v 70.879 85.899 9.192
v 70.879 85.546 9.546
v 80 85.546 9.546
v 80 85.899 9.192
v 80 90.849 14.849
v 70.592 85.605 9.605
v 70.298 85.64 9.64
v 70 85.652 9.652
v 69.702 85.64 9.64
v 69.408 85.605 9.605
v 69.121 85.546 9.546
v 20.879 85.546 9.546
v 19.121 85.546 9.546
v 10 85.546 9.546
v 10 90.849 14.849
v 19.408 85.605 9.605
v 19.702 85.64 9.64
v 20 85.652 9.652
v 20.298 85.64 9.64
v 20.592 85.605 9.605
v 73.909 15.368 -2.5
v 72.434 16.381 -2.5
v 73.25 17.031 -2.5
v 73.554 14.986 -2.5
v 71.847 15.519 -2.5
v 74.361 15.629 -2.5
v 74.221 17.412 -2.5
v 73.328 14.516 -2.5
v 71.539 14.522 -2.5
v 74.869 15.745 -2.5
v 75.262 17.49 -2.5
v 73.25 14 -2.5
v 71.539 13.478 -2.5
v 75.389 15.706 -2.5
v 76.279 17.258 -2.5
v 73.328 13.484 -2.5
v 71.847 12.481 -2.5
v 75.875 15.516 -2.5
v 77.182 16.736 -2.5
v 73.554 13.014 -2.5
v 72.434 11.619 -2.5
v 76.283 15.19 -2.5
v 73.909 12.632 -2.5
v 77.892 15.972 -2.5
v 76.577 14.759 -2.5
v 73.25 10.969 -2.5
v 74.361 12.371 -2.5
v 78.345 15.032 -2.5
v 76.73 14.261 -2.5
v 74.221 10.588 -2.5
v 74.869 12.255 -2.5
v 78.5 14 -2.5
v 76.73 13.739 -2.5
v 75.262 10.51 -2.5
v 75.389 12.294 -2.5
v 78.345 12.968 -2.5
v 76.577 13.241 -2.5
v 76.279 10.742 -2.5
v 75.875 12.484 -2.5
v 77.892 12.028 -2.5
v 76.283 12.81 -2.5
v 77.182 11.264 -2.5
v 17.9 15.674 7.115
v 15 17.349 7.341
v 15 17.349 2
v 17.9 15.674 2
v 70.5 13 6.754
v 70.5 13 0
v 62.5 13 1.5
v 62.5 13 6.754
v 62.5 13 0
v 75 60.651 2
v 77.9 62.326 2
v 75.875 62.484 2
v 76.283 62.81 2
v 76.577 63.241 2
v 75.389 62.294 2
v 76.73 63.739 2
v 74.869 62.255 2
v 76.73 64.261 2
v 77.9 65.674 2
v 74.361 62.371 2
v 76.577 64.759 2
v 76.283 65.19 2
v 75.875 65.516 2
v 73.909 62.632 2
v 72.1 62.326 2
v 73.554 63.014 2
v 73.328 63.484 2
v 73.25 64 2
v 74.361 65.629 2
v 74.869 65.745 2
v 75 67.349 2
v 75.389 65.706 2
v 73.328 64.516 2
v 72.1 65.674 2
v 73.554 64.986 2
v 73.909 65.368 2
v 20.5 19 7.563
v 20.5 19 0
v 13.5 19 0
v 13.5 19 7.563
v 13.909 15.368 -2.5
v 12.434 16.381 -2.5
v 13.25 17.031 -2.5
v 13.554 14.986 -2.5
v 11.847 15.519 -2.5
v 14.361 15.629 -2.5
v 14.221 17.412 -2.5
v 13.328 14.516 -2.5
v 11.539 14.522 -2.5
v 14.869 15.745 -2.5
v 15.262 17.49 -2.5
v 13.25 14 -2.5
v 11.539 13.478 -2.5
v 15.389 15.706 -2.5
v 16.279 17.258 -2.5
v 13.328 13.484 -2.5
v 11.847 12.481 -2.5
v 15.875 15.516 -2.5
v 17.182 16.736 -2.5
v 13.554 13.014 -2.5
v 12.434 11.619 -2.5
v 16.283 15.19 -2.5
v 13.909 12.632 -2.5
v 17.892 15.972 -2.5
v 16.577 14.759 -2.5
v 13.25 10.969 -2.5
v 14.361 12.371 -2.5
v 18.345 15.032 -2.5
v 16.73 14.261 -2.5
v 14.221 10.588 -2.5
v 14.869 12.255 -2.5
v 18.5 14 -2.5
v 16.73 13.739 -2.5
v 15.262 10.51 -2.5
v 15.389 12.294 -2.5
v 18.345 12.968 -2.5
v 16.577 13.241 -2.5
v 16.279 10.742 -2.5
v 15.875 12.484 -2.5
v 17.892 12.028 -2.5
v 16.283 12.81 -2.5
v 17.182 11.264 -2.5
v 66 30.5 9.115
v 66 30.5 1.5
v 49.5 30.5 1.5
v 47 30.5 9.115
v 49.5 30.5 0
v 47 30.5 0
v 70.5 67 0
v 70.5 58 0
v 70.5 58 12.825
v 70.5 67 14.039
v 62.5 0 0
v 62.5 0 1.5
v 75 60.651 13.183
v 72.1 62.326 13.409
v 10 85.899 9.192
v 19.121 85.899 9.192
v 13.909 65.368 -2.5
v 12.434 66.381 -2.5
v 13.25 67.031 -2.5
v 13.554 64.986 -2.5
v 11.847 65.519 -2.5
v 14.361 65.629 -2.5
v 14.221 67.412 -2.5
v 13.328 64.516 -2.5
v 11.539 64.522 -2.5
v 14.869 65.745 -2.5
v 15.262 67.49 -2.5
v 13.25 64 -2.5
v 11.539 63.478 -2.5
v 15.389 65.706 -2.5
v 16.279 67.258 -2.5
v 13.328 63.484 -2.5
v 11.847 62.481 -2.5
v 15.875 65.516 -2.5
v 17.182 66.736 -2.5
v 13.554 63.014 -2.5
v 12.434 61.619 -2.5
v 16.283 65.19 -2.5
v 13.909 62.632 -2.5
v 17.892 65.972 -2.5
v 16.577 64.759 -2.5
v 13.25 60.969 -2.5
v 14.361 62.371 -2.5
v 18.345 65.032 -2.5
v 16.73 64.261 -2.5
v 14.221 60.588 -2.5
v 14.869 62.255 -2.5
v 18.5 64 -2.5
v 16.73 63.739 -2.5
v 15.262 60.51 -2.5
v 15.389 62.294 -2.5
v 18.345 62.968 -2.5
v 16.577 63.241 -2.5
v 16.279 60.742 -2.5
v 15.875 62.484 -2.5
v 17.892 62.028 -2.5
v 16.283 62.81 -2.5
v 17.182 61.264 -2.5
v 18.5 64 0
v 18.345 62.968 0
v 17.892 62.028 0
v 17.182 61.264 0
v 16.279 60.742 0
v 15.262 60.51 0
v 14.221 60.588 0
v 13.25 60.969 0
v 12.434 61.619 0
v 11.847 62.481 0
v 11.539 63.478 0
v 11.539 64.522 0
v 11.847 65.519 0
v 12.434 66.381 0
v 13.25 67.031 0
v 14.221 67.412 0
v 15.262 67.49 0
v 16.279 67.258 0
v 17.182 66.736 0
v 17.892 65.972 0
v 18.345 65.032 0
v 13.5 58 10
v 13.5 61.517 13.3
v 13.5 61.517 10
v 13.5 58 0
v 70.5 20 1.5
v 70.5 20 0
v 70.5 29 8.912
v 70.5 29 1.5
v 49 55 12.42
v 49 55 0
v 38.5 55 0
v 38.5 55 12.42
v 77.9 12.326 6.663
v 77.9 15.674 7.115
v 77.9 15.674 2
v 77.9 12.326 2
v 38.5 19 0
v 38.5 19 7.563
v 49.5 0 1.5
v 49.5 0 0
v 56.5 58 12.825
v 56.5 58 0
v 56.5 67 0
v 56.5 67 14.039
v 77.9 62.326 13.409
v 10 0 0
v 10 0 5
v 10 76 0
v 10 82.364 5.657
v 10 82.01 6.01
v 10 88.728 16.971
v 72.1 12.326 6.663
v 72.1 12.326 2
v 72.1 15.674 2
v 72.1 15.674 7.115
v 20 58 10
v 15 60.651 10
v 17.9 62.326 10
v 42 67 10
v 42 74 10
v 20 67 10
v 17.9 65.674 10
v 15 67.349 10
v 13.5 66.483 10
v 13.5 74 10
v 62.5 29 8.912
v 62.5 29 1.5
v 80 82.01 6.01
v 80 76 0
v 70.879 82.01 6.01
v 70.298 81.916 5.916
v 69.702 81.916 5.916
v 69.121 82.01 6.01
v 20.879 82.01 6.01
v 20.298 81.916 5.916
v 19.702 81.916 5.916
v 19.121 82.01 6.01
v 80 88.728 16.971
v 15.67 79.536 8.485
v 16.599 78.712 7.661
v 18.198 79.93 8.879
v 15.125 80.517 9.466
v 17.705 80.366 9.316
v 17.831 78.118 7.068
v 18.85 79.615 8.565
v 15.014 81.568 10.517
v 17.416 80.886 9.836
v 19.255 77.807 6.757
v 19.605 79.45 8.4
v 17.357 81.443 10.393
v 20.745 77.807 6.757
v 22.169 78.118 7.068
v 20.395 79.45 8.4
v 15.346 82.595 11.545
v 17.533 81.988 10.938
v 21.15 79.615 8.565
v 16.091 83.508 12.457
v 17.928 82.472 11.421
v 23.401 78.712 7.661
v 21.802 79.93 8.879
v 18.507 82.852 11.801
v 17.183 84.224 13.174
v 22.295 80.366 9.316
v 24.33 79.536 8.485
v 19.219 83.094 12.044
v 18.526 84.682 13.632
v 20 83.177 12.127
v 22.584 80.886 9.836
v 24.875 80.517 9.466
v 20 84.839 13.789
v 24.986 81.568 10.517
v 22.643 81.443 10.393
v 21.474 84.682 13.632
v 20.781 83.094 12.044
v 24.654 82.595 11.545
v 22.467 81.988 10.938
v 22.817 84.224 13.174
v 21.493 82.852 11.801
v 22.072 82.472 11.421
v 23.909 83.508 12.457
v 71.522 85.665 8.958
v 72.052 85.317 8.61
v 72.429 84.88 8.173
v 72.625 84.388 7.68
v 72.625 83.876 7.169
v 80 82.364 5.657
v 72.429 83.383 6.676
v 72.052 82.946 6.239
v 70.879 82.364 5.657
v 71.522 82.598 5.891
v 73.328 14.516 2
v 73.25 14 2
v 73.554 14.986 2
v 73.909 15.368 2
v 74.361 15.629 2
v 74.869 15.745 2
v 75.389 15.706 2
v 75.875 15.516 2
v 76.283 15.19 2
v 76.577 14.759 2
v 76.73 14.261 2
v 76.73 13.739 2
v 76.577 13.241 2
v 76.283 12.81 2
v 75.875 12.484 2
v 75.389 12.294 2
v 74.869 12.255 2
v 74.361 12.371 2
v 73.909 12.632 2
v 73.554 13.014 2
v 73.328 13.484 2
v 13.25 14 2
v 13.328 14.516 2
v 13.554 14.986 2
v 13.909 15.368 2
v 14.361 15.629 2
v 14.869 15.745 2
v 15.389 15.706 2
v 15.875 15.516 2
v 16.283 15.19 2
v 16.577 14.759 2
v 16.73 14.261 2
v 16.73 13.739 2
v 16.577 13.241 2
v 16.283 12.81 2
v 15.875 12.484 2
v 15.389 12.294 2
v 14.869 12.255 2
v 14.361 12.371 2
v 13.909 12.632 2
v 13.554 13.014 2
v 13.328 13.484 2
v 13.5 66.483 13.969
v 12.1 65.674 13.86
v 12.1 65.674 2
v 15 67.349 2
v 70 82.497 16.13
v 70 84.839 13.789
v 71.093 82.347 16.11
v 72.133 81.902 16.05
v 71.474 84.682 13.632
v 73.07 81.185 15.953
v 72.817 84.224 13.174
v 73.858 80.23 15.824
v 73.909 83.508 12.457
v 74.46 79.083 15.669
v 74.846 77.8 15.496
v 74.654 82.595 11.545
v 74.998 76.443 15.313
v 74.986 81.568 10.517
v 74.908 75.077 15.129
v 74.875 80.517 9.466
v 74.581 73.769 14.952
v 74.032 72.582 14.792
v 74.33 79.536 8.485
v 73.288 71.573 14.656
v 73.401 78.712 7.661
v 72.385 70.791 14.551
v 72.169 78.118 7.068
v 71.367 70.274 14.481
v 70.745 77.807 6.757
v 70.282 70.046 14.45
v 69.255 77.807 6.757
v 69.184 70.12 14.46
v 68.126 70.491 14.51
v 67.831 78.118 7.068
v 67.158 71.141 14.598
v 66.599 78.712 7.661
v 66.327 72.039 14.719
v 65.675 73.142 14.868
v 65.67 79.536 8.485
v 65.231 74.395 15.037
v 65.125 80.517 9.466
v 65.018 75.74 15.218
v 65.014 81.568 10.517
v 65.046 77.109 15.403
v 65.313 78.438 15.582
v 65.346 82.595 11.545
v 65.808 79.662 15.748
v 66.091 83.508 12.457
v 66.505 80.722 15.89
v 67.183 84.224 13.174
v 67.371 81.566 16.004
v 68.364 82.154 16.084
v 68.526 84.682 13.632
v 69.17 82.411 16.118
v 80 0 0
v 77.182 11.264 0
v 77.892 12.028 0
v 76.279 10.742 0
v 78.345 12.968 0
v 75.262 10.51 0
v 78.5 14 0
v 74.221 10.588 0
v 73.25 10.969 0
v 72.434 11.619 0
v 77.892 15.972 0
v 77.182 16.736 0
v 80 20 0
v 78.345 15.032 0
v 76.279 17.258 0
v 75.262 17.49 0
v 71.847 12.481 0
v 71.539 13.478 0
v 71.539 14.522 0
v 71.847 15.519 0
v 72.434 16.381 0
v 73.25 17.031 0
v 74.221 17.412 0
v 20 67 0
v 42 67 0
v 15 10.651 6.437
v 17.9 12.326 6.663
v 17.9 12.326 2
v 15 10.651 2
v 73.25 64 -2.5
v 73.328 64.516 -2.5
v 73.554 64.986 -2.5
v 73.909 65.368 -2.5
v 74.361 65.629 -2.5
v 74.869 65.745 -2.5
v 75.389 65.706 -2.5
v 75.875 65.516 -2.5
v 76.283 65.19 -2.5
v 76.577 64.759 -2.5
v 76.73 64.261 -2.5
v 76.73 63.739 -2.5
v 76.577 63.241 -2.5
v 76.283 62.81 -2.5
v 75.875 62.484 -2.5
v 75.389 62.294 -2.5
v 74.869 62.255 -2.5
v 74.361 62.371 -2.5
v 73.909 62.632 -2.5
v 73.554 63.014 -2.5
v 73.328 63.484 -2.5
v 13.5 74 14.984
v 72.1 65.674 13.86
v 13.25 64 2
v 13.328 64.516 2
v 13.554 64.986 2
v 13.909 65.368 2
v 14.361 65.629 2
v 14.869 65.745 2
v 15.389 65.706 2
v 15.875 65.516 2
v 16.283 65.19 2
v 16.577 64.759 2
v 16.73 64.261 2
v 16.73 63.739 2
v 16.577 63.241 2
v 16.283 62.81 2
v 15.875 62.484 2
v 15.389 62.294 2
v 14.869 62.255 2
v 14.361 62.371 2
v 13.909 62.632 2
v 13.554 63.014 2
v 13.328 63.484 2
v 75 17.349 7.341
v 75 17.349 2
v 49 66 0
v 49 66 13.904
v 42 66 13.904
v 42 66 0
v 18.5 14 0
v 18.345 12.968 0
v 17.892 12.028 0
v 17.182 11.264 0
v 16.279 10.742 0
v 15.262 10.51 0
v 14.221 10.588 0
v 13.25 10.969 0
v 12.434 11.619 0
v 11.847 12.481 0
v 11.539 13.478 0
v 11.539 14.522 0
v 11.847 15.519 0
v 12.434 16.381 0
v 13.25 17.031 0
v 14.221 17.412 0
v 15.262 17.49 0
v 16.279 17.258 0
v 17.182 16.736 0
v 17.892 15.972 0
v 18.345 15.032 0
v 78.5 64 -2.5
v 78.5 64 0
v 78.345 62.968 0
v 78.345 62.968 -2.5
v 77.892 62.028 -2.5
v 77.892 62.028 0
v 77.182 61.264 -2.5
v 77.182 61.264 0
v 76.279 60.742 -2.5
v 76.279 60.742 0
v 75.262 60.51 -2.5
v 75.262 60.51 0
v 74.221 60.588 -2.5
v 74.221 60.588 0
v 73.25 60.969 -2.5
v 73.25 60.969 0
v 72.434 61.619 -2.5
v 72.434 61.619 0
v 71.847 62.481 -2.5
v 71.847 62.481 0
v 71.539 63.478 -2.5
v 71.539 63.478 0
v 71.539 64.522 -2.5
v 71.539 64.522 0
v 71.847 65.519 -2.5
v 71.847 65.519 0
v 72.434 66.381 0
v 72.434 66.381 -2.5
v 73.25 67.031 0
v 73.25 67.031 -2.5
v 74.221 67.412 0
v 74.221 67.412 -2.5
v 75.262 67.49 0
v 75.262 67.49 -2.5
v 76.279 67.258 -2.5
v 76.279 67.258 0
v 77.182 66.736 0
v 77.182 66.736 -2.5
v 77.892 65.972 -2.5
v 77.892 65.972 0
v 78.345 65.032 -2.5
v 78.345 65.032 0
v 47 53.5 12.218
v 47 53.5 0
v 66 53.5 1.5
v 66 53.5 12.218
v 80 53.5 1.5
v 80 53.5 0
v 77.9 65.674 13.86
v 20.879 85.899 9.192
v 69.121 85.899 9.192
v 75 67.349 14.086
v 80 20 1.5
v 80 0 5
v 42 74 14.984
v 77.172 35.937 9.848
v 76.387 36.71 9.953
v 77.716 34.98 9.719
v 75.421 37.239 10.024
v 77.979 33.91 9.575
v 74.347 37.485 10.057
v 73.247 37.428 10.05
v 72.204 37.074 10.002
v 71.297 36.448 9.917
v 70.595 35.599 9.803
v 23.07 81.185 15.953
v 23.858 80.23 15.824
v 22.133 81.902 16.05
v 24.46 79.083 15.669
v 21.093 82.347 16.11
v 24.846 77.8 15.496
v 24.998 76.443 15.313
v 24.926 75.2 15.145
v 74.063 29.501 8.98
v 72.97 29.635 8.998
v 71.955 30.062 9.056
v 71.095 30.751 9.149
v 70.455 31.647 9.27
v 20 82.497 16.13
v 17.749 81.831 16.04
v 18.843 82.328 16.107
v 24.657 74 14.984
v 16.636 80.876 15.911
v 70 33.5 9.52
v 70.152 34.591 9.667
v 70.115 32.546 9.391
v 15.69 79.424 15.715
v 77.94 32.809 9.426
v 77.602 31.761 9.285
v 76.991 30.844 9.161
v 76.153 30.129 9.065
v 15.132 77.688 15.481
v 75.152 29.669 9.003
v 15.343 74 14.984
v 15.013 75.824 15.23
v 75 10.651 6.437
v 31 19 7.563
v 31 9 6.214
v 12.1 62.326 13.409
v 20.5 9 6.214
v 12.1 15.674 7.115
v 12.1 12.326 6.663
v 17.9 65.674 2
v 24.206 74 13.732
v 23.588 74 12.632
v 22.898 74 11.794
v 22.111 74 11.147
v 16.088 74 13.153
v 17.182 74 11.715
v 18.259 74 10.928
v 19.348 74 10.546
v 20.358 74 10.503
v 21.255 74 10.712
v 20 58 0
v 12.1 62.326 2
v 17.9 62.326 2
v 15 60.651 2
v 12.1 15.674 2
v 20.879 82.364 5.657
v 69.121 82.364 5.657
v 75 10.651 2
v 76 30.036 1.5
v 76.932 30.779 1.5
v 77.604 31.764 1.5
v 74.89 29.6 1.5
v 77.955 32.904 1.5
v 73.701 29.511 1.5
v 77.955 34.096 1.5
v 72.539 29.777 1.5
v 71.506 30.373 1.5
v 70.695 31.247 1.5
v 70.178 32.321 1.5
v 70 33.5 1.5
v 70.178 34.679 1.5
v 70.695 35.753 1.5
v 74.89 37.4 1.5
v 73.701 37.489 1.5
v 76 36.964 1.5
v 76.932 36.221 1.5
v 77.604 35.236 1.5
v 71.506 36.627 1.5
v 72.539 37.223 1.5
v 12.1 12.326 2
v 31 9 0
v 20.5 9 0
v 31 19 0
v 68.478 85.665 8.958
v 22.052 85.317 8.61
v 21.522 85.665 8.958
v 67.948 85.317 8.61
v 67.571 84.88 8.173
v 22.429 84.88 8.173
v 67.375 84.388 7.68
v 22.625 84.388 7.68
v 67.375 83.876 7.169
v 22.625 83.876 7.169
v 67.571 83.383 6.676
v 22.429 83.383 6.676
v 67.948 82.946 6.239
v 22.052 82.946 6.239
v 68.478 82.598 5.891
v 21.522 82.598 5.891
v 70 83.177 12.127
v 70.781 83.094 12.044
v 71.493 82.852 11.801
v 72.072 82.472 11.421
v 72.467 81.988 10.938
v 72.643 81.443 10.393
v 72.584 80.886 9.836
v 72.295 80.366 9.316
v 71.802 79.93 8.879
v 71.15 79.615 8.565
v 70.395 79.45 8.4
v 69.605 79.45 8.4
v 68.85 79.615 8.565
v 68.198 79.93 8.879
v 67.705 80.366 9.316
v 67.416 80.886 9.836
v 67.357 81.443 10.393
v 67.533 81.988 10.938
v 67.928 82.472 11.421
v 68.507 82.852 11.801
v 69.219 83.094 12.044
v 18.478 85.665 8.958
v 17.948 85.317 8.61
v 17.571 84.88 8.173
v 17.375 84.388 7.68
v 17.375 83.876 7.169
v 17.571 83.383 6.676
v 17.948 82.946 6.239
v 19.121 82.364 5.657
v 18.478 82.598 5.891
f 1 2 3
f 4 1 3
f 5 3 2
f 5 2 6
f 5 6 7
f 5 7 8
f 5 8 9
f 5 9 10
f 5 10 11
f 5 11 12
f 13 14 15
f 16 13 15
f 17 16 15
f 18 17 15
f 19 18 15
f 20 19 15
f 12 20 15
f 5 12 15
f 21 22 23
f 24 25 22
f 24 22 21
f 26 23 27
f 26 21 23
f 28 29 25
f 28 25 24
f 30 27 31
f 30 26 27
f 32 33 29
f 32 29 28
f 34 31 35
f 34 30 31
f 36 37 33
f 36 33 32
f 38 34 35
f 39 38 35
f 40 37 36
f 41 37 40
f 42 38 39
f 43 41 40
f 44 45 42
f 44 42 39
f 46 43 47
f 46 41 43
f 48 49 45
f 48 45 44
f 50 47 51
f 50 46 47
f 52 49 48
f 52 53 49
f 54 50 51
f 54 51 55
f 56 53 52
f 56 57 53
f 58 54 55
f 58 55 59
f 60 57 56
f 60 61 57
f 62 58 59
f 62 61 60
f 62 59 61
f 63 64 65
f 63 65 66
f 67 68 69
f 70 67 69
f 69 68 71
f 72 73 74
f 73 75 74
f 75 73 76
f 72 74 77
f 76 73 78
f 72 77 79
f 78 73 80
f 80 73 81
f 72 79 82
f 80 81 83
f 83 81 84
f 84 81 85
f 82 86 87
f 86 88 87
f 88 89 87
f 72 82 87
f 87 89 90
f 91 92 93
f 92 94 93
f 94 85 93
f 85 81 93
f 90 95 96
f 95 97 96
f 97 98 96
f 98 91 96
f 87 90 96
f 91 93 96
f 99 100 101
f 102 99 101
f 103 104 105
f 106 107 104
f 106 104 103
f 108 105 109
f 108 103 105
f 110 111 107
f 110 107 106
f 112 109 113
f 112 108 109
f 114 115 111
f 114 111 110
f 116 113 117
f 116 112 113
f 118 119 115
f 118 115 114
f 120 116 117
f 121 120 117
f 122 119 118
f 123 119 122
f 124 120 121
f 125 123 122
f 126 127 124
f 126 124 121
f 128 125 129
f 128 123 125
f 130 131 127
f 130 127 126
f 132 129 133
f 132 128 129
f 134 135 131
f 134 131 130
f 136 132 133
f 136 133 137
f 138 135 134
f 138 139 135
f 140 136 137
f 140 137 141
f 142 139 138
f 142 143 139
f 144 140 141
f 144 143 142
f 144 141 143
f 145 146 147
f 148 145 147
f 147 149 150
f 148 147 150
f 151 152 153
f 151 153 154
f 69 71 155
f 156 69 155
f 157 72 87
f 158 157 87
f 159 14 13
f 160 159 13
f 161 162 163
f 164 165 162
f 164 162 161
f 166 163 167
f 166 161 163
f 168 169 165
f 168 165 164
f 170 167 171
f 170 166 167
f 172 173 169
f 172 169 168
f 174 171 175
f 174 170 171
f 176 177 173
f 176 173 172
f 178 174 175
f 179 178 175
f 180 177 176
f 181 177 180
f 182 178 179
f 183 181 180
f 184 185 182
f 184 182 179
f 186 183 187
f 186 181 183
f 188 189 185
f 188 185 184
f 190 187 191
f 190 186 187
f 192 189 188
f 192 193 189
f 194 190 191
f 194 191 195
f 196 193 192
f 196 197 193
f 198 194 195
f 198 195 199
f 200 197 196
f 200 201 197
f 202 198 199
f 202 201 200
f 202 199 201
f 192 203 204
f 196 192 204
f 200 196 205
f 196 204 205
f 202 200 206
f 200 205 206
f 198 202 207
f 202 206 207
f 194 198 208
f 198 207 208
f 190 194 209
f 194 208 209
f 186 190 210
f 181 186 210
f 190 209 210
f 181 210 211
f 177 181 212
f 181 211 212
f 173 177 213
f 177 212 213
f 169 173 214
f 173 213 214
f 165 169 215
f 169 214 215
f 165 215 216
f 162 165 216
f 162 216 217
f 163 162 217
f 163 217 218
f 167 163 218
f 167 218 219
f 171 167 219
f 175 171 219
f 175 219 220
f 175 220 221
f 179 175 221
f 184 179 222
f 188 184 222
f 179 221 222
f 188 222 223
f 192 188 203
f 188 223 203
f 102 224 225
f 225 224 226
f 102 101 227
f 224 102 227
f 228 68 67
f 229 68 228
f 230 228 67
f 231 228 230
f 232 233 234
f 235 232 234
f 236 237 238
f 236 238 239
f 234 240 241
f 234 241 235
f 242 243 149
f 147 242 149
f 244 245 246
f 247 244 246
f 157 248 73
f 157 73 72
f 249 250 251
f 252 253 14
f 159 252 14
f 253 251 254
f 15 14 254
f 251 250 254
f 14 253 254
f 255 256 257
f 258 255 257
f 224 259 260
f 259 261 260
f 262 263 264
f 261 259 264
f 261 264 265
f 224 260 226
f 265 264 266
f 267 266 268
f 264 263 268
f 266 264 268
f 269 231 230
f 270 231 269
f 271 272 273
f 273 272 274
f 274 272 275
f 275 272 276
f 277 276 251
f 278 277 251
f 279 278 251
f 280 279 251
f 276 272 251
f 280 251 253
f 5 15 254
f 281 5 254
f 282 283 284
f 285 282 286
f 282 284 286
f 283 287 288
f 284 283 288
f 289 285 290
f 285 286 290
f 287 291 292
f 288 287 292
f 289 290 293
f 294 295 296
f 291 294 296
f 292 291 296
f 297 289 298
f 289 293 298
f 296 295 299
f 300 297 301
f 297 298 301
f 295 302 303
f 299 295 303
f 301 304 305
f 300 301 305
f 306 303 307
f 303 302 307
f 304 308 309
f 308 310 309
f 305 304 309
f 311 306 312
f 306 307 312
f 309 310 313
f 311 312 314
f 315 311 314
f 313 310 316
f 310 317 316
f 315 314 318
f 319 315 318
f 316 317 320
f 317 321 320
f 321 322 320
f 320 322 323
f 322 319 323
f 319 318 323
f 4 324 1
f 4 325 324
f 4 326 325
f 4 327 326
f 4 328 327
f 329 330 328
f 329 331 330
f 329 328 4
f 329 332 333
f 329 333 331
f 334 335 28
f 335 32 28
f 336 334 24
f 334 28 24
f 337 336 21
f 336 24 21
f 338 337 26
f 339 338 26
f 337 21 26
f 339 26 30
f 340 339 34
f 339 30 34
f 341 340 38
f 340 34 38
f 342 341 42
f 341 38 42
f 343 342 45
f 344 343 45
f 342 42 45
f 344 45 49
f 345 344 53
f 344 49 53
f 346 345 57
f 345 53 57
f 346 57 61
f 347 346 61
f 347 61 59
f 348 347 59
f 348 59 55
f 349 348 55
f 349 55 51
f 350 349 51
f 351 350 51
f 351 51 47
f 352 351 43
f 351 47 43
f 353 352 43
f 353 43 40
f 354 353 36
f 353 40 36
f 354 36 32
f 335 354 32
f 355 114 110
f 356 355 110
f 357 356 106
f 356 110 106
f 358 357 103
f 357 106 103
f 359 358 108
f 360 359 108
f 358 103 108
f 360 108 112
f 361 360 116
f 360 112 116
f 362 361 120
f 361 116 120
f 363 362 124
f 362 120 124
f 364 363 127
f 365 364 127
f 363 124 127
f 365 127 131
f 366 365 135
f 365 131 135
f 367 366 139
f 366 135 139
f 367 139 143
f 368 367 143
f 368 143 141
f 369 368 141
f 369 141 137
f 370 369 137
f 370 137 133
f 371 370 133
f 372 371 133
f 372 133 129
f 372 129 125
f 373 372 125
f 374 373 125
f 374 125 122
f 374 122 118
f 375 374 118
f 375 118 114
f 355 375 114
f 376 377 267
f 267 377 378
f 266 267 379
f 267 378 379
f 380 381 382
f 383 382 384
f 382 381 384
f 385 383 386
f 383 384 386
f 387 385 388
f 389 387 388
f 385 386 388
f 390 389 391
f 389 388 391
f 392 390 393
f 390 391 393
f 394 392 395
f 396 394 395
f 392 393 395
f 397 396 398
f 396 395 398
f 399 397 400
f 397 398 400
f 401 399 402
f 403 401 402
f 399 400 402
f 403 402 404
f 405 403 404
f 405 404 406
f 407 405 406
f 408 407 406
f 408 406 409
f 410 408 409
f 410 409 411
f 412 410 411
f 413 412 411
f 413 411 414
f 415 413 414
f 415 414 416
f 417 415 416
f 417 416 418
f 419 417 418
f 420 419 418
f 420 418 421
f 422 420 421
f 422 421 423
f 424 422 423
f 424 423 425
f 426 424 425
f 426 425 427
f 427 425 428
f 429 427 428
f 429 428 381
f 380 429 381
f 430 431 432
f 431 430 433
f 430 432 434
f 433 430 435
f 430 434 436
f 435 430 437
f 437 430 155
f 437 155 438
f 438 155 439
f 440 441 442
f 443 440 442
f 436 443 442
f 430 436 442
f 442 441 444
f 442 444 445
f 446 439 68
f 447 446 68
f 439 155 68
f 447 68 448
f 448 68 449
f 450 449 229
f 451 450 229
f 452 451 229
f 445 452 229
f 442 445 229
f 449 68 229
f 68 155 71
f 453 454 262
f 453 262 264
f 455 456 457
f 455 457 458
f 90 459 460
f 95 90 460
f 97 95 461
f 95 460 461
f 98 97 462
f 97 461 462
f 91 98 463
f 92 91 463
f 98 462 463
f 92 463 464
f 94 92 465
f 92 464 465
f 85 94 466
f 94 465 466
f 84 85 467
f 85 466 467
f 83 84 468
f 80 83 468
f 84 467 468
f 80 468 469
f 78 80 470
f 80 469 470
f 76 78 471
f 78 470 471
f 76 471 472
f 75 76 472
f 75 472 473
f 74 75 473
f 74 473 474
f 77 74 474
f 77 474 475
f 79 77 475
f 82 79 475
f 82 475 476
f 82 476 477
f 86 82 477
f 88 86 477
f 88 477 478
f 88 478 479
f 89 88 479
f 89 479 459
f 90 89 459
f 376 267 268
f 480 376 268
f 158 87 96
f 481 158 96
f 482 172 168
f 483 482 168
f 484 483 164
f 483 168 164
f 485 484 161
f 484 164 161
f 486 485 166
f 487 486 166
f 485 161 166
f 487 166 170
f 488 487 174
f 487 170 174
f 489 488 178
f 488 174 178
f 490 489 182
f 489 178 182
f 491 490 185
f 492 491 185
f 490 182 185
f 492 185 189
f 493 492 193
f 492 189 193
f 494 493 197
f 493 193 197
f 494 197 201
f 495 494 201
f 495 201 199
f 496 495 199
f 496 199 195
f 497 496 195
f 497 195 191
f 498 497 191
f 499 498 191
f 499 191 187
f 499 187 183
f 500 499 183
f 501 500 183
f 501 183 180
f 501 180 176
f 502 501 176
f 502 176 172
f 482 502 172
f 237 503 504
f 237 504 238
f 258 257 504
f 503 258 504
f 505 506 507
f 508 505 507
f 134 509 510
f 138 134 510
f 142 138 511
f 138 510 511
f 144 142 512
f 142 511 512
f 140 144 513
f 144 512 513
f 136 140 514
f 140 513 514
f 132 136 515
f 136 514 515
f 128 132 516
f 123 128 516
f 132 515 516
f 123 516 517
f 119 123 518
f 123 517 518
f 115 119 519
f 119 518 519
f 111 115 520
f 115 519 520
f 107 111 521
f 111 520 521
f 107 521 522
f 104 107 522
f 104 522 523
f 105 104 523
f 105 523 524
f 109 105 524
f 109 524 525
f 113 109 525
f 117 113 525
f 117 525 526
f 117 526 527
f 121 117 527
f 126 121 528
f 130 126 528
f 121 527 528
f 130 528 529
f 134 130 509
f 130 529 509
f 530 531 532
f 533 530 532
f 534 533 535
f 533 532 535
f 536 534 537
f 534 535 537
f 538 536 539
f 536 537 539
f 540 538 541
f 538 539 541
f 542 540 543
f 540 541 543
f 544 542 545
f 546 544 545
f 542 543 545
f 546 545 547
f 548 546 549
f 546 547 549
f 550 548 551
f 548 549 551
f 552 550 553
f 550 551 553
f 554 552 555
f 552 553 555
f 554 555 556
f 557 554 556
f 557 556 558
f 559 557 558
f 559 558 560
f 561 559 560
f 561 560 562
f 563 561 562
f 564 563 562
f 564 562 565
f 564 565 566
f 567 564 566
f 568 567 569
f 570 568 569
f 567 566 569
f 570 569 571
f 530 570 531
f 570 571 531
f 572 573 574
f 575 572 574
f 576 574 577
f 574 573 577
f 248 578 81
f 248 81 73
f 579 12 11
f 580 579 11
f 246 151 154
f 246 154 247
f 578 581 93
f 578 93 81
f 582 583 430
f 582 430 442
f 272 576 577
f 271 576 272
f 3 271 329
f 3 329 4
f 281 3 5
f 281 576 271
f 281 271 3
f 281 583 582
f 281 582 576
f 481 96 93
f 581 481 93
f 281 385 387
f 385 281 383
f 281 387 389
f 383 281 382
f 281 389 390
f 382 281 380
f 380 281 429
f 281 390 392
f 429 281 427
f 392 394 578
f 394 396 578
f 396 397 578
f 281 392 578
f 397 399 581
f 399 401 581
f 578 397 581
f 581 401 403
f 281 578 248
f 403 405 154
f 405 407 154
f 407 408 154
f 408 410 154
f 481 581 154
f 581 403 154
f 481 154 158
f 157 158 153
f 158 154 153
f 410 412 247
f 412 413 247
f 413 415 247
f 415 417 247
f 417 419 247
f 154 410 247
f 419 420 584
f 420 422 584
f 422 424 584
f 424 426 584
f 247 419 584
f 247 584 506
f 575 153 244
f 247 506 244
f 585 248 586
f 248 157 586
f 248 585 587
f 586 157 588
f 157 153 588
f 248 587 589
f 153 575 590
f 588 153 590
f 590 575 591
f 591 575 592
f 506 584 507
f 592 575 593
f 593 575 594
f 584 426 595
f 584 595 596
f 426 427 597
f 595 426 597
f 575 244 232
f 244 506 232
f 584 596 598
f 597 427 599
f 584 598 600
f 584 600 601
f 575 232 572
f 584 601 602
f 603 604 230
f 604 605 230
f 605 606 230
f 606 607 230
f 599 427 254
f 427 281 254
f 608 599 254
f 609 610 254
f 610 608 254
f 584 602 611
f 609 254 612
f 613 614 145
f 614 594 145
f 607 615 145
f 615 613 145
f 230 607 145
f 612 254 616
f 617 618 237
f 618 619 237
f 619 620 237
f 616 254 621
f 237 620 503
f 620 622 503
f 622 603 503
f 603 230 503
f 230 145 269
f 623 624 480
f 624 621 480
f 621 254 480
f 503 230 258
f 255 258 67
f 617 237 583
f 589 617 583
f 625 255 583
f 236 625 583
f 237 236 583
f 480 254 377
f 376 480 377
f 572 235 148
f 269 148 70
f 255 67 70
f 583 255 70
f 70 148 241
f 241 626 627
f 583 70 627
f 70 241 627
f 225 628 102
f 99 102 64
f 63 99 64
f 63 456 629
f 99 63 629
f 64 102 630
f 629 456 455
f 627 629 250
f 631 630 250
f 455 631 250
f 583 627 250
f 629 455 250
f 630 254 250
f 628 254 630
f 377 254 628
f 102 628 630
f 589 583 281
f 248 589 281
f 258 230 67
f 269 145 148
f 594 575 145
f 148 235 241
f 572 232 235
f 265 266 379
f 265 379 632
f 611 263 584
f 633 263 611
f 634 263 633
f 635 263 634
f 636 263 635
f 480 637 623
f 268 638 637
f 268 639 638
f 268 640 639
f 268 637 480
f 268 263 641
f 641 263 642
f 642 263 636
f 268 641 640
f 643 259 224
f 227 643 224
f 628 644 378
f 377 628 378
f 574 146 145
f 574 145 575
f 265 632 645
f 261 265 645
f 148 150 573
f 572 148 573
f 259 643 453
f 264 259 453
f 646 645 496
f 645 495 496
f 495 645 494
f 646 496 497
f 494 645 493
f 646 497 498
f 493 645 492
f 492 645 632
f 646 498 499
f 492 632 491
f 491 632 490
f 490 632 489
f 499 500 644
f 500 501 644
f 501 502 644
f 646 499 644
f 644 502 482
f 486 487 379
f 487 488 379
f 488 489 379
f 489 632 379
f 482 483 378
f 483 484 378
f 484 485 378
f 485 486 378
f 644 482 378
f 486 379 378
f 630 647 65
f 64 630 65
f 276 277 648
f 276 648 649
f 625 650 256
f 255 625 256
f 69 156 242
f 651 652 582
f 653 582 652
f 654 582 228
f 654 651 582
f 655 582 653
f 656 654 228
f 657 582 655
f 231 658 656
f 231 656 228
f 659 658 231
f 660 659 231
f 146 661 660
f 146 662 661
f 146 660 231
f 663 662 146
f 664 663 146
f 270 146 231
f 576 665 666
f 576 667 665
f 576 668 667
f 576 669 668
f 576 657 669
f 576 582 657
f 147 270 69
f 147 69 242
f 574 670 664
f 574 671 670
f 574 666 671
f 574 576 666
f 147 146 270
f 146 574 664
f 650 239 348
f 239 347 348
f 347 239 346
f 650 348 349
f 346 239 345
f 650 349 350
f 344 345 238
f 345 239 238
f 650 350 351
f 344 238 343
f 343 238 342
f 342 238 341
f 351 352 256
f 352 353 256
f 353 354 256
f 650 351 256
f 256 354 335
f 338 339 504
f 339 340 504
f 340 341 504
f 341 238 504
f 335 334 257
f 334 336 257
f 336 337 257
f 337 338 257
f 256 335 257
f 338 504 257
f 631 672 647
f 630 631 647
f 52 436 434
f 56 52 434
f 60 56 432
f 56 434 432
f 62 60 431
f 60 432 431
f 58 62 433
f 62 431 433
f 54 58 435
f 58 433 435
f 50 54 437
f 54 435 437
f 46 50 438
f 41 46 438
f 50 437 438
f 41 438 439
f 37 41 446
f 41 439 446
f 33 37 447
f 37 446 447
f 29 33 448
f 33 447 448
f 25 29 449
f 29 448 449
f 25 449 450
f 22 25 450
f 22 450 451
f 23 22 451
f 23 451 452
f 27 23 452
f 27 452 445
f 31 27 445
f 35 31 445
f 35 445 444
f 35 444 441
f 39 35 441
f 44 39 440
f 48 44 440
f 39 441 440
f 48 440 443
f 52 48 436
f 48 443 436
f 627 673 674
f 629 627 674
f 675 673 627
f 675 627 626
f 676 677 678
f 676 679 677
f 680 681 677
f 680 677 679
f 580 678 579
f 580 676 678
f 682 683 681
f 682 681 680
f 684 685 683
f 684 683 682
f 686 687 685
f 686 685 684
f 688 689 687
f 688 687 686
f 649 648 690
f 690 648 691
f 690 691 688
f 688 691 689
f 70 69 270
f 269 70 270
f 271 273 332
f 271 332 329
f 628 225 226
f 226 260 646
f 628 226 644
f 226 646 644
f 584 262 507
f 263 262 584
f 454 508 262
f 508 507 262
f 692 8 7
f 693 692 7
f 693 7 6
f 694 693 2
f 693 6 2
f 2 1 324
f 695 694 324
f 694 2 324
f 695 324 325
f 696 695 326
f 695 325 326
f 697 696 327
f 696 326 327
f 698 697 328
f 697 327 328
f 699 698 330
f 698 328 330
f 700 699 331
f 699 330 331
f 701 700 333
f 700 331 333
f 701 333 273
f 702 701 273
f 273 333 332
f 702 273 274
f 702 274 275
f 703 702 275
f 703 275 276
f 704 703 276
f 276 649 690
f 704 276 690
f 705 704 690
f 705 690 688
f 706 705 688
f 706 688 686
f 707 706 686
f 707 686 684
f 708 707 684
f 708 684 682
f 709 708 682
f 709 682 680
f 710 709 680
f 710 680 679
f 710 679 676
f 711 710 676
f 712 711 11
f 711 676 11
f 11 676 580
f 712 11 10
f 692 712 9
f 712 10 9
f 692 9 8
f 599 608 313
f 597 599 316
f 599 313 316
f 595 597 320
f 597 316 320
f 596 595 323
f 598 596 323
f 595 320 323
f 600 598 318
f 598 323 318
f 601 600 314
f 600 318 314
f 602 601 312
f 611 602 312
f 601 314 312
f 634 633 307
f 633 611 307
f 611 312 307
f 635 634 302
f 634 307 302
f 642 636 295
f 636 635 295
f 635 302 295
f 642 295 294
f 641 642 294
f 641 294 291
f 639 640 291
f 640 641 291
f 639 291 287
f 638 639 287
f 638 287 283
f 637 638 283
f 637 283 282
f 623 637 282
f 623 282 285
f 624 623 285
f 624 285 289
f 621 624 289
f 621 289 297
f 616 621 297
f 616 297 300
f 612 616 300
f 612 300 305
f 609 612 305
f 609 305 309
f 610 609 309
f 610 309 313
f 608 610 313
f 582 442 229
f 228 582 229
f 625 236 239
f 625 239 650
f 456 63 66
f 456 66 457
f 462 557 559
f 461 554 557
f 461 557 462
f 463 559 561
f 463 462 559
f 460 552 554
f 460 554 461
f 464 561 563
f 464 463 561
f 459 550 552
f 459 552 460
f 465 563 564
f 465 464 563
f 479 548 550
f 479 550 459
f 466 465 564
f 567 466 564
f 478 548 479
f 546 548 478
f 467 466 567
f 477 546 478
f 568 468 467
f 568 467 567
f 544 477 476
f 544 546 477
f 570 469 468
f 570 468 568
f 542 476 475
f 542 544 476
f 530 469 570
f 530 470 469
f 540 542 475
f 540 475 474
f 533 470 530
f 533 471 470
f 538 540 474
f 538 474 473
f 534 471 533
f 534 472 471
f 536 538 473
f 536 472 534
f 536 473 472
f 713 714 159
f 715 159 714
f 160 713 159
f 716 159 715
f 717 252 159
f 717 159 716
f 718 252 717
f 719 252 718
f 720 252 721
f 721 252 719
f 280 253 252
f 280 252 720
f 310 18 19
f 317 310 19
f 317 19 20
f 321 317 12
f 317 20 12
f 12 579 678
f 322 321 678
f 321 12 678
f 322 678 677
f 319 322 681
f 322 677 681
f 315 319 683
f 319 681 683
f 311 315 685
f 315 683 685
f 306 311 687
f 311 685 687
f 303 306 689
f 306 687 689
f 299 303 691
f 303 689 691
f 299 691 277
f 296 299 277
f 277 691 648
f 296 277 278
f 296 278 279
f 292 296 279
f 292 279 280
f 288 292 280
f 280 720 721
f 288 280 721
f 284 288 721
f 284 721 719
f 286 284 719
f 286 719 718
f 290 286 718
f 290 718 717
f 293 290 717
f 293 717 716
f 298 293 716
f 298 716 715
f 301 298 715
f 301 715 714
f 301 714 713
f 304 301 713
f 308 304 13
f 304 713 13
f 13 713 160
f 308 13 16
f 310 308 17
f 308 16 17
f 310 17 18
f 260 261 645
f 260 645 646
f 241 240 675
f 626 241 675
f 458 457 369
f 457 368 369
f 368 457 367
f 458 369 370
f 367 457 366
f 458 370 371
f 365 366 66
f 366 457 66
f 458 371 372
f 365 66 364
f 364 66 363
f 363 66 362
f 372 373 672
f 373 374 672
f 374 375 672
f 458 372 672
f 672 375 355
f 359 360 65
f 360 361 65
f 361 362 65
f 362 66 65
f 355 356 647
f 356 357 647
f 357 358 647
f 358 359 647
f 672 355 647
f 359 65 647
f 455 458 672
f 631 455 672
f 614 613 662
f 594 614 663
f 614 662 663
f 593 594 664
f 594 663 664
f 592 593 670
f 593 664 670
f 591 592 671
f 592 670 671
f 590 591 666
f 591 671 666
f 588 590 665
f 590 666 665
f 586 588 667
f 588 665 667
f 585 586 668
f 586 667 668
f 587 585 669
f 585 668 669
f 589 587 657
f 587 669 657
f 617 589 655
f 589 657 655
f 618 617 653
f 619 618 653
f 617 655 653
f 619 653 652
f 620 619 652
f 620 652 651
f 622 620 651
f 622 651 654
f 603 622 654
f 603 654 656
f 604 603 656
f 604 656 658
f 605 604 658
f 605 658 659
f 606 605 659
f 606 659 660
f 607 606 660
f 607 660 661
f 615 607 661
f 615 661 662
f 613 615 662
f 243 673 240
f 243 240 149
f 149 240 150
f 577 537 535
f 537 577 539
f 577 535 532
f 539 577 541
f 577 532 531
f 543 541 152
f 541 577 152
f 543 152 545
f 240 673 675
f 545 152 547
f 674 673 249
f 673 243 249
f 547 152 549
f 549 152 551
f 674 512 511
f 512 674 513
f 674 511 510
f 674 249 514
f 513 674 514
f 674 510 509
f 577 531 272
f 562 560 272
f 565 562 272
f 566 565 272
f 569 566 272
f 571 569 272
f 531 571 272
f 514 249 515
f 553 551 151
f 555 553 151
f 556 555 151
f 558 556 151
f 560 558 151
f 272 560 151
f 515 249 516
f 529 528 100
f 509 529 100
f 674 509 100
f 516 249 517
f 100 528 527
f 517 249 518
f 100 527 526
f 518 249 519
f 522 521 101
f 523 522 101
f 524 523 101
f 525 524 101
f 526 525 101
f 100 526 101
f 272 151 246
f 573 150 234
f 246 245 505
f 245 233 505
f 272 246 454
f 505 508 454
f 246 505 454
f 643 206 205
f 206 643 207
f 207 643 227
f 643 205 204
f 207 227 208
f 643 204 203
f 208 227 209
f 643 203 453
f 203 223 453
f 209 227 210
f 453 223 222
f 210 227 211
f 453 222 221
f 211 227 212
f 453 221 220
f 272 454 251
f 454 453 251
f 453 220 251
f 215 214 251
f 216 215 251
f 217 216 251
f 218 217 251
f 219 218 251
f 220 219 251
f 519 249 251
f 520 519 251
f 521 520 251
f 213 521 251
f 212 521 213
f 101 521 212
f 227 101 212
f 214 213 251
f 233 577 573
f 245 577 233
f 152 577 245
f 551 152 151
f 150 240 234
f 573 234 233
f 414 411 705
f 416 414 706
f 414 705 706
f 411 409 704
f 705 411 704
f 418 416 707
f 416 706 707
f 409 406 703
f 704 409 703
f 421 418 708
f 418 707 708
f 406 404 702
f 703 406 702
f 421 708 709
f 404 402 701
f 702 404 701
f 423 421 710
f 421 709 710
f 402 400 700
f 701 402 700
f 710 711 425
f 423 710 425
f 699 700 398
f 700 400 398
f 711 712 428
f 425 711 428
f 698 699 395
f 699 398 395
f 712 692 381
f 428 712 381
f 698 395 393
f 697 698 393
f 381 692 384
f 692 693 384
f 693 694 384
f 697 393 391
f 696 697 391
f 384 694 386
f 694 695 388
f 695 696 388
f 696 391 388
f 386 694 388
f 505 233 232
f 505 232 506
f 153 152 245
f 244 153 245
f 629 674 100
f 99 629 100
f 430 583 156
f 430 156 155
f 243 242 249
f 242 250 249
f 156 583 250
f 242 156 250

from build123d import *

# Parameters (mm, degrees)
EXTRUDE_1_DEPTH     = 90
SKETCH_2_R          = 1.75
CUT_EXTRUDE_1_DEPTH = 130.002266823
SKETCH_3_R          = 4
SKETCH_3_W          = 25
SKETCH_3_H          = 39
SKETCH_3_W_2        = 10.5
SKETCH_3_H_2        = 10
SKETCH_3_W_3        = 22
SKETCH_3_H_3        = 11
SKETCH_3_W_4        = 11
SKETCH_3_W_5        = 14
SKETCH_3_H_4        = 9
SKETCH_3_W_6        = 9.5
SKETCH_3_H_5        = 42
SKETCH_3_W_7        = 8
SKETCH_3_H_6        = 16
SKETCH_3_W_8        = 19
SKETCH_3_H_7        = 23
CUT_EXTRUDE_2_DEPTH = 130.002266823
CUT_EXTRUDE_3_REACH = 133.002
CUT_EXTRUDE_START   = -2
CUT_EXTRUDE_4_DEPTH = 1.5
SKETCH_6_W          = 90
SKETCH_6_H          = 5
EXTRUDE_2_DEPTH     = 0.5
SKETCH_7_R          = 2.65
CUT_EXTRUDE_5_DEPTH = 118.968449984
CUT_EXTRUDE_6_REACH = 123.968
CUT_EXTRUDE_START_2 = -4
SKETCH_8_R          = 5
SKETCH_9_R          = 3.5
EXTRUDE_3_DEPTH     = 2.5
SKETCH_10_R         = 1.75
CUT_EXTRUDE_7_DEPTH = 130.354890357
CUT_EXTRUDE_8_REACH = 141.002
CUT_EXTRUDE_START_3 = -10
SKETCH_11_W         = 28.5
SKETCH_11_H         = 18
SKETCH_12_W         = 10
SKETCH_12_H         = 98.345155262
SKETCH_12_H_2       = 101.038352977
CUT_EXTRUDE_9_DEPTH = 129.917968218


with BuildPart() as part:
    # 草图1 → 凸台-拉伸1 (new body)
    with BuildSketch(Plane(origin=(0, 0, 0), x_dir=(0, 0, -1), z_dir=(1, 0, 0))):
        Polygon((0, 0), (0, 76), (-14.849242405, 90.849242405), (-16.970562748, 88.727922061), (-5, 0), align=None)
    extrude(amount=EXTRUDE_1_DEPTH)

    # 草图2 → 切除-拉伸1 (cut, through all)
    with BuildSketch(Plane(origin=(0, 0, 0), x_dir=(-1, 0, 0), z_dir=(0, 0, -1))):
        with Locations((-75, 64)):
            Circle(SKETCH_2_R)
        with Locations((-15, 64)):
            Circle(SKETCH_2_R)
        with Locations((-15, 14)):
            Circle(SKETCH_2_R)
        with Locations((-75, 14)):
            Circle(SKETCH_2_R)
    extrude(amount=-CUT_EXTRUDE_1_DEPTH, mode=Mode.SUBTRACT)

    # 草图3 → 切除-拉伸2 (cut, through all)
    with BuildSketch(Plane(origin=(0, 0, 0), x_dir=(-1, 0, 0), z_dir=(0, 0, -1))):
        with Locations((-74, 33.5)):
            Circle(SKETCH_3_R)
        with Locations((-26, 38.5)):
            Rectangle(SKETCH_3_W, SKETCH_3_H)
        with Locations((-25.75, 14)):
            Rectangle(SKETCH_3_W_2, SKETCH_3_H_2)
        with Locations((-31, 61.5)):
            Rectangle(SKETCH_3_W_3, SKETCH_3_H_3)
        with Locations((-43.5, 60.5)):
            Rectangle(SKETCH_3_W_4, SKETCH_3_H_3)
        with Locations((-63.5, 62.5)):
            Rectangle(SKETCH_3_W_5, SKETCH_3_H_4)
        with Locations((-85.25, 34)):
            Rectangle(SKETCH_3_W_6, SKETCH_3_H_5)
        with Locations((-66.5, 21)):
            Rectangle(SKETCH_3_W_7, SKETCH_3_H_6)
        with Locations((-56.5, 42)):
            Rectangle(SKETCH_3_W_8, SKETCH_3_H_7)
    extrude(amount=-CUT_EXTRUDE_2_DEPTH, mode=Mode.SUBTRACT)

    # 切除-拉伸3: up to this plane
    cut_extrude_3_end = Plane(origin=(90, 88.727922061, 16.970562748), z_dir=(0, 0.13370183830700452, -0.9910216034140364))
    # 草图4 → 切除-拉伸3 (cut, up to the surface)
    with BuildSketch(Plane(origin=(0, 0, 0), x_dir=(-1, 0, 0), z_dir=(0, 0, -1)).offset(CUT_EXTRUDE_START), mode=Mode.PRIVATE) as cut_extrude_3_sk1:
        Polygon((-75, 60.651368439), (-72.1, 62.325684219), (-72.1, 65.674315781), (-75, 67.348631561), (-77.9, 65.674315781), (-77.9, 62.325684219), align=None)
    cut_extrude_3_tool1 = split(extrude(cut_extrude_3_sk1.sketch, amount=-CUT_EXTRUDE_3_REACH, mode=Mode.PRIVATE), bisect_by=cut_extrude_3_end, keep=Keep.BOTH, mode=Mode.PRIVATE)
    add(cut_extrude_3_tool1.solids().sort_by_distance((75, 64, 2))[0], mode=Mode.SUBTRACT)
    # 草图4 → 切除-拉伸3 (cut, up to the surface)
    with BuildSketch(Plane(origin=(0, 0, 0), x_dir=(-1, 0, 0), z_dir=(0, 0, -1)).offset(CUT_EXTRUDE_START), mode=Mode.PRIVATE) as cut_extrude_3_sk2:
        Polygon((-15, 60.651368439), (-12.1, 62.325684219), (-12.1, 65.674315781), (-15, 67.348631561), (-17.9, 65.674315781), (-17.9, 62.325684219), align=None)
    cut_extrude_3_tool2 = split(extrude(cut_extrude_3_sk2.sketch, amount=-CUT_EXTRUDE_3_REACH, mode=Mode.PRIVATE), bisect_by=cut_extrude_3_end, keep=Keep.BOTH, mode=Mode.PRIVATE)
    add(cut_extrude_3_tool2.solids().sort_by_distance((15, 64, 2))[0], mode=Mode.SUBTRACT)
    # 草图4 → 切除-拉伸3 (cut, up to the surface)
    with BuildSketch(Plane(origin=(0, 0, 0), x_dir=(-1, 0, 0), z_dir=(0, 0, -1)).offset(CUT_EXTRUDE_START), mode=Mode.PRIVATE) as cut_extrude_3_sk3:
        Polygon((-15, 10.651368439), (-12.1, 12.325684219), (-12.1, 15.674315781), (-15, 17.348631561), (-17.9, 15.674315781), (-17.9, 12.325684219), align=None)
    cut_extrude_3_tool3 = split(extrude(cut_extrude_3_sk3.sketch, amount=-CUT_EXTRUDE_3_REACH, mode=Mode.PRIVATE), bisect_by=cut_extrude_3_end, keep=Keep.BOTH, mode=Mode.PRIVATE)
    add(cut_extrude_3_tool3.solids().sort_by_distance((15, 14, 2))[0], mode=Mode.SUBTRACT)
    # 草图4 → 切除-拉伸3 (cut, up to the surface)
    with BuildSketch(Plane(origin=(0, 0, 0), x_dir=(-1, 0, 0), z_dir=(0, 0, -1)).offset(CUT_EXTRUDE_START), mode=Mode.PRIVATE) as cut_extrude_3_sk4:
        Polygon((-75, 10.651368439), (-72.1, 12.325684219), (-72.1, 15.674315781), (-75, 17.348631561), (-77.9, 15.674315781), (-77.9, 12.325684219), align=None)
    cut_extrude_3_tool4 = split(extrude(cut_extrude_3_sk4.sketch, amount=-CUT_EXTRUDE_3_REACH, mode=Mode.PRIVATE), bisect_by=cut_extrude_3_end, keep=Keep.BOTH, mode=Mode.PRIVATE)
    add(cut_extrude_3_tool4.solids().sort_by_distance((75, 14, 2))[0], mode=Mode.SUBTRACT)

    # 草图5 → 切除-拉伸4 (cut)
    with BuildSketch(Plane(origin=(0, 0, 0), x_dir=(-1, 0, 0), z_dir=(0, 0, -1))):
        Polygon((-70.5, 20), (-70.5, 29), (-62.5, 29), (-62.5, 0), (-49.5, 0), (-49.5, 30.5), (-66, 30.5), (-66, 53.5), (-80.5, 53.5), (-80.5, 20), align=None)
    extrude(amount=-CUT_EXTRUDE_4_DEPTH, mode=Mode.SUBTRACT)

    # 草图6 → 凸台-拉伸2 (add)
    with BuildSketch(Plane(origin=(0, 38, -38), x_dir=(1, 0, 0), z_dir=(0, 0.7071067811865482, -0.7071067811865468))):
        with Locations((45, -64.74011537)):
            Rectangle(SKETCH_6_W, SKETCH_6_H)
    extrude(amount=EXTRUDE_2_DEPTH)

    # 草图7 → 切除-拉伸5 (cut, through all)
    with BuildSketch(Plane(origin=(0, 38.353553391, -38.353553391), x_dir=(1, 0, 0), z_dir=(0, 0.7071067811865489, -0.7071067811865461))):
        with Locations(Location((20, -64.74011537, 0), (0, 0, 270))):
            Circle(SKETCH_7_R)
        with Locations(Location((70, -64.74011537, 0), (0, 0, 270))):
            Circle(SKETCH_7_R)
    extrude(amount=-CUT_EXTRUDE_5_DEPTH, mode=Mode.SUBTRACT)

    # 切除-拉伸6: up to this plane
    cut_extrude_6_end = Plane(origin=(90, 88.727922061, 16.970562748), z_dir=(0, 0.13370183830700452, -0.9910216034140364))
    # 草图8 → 切除-拉伸6 (cut, up to the surface)
    with BuildSketch(Plane(origin=(0, 38.353553391, -38.353553391), x_dir=(1, 0, 0), z_dir=(0, 0.7071067811865489, -0.7071067811865461)).offset(CUT_EXTRUDE_START_2), mode=Mode.PRIVATE) as cut_extrude_6_sk1:
        with Locations(Location((20, -64.74011537, 0), (0, 0, 270))):
            Circle(SKETCH_8_R)
    cut_extrude_6_tool1 = split(extrude(cut_extrude_6_sk1.sketch, amount=-CUT_EXTRUDE_6_REACH, mode=Mode.PRIVATE), bisect_by=cut_extrude_6_end, keep=Keep.BOTH, mode=Mode.PRIVATE)
    add(cut_extrude_6_tool1.solids().sort_by_distance((20, 81.303301, 10.253048))[0], mode=Mode.SUBTRACT)
    # 草图8 → 切除-拉伸6 (cut, up to the surface)
    with BuildSketch(Plane(origin=(0, 38.353553391, -38.353553391), x_dir=(1, 0, 0), z_dir=(0, 0.7071067811865489, -0.7071067811865461)).offset(CUT_EXTRUDE_START_2), mode=Mode.PRIVATE) as cut_extrude_6_sk2:
        with Locations(Location((70, -64.74011537, 0), (0, 0, 270))):
            Circle(SKETCH_8_R)
    cut_extrude_6_tool2 = split(extrude(cut_extrude_6_sk2.sketch, amount=-CUT_EXTRUDE_6_REACH, mode=Mode.PRIVATE), bisect_by=cut_extrude_6_end, keep=Keep.BOTH, mode=Mode.PRIVATE)
    add(cut_extrude_6_tool2.solids().sort_by_distance((70, 81.303301, 10.253048))[0], mode=Mode.SUBTRACT)

    # 草图9 → 凸台-拉伸3 (add)
    with BuildSketch(Plane(origin=(0, 0, 0), x_dir=(-1, 0, 0), z_dir=(0, 0, -1))):
        with Locations(Location((-75, 64, 0), (0, 0, 180))):
            Circle(SKETCH_9_R)
        with Locations(Location((-15, 64, 0), (0, 0, 180))):
            Circle(SKETCH_9_R)
        with Locations(Location((-15, 14, 0), (0, 0, 180))):
            Circle(SKETCH_9_R)
        with Locations(Location((-75, 14, 0), (0, 0, 180))):
            Circle(SKETCH_9_R)
    extrude(amount=EXTRUDE_3_DEPTH)

    # 草图10 → 切除-拉伸7 (cut, through all)
    with BuildSketch(Plane(origin=(0, 0, -2.5), x_dir=(-1, 0, 0), z_dir=(0, 0, -1))):
        with Locations((-75, 14)):
            Circle(SKETCH_10_R)
        with Locations((-15, 14)):
            Circle(SKETCH_10_R)
        with Locations((-15, 64)):
            Circle(SKETCH_10_R)
        with Locations((-75, 64)):
            Circle(SKETCH_10_R)
    extrude(amount=-CUT_EXTRUDE_7_DEPTH, mode=Mode.SUBTRACT)

    # 草图11 → 切除-拉伸8 (cut, up to next)
    with BuildSketch(Plane(origin=(0, 0, 0), x_dir=(-1, 0, 0), z_dir=(0, 0, -1)).offset(CUT_EXTRUDE_START_3), mode=Mode.PRIVATE) as cut_extrude_8_sk1:
        with Locations((-27.75, 65)):
            Rectangle(SKETCH_11_W, SKETCH_11_H)
    cut_extrude_8_tool1 = extrude(cut_extrude_8_sk1.sketch, amount=-CUT_EXTRUDE_8_REACH, mode=Mode.PRIVATE) & part.part
    add(cut_extrude_8_tool1.solids().sort_by_distance((27.75, 65, 10))[0], mode=Mode.SUBTRACT)

    # 草图12 → 切除-拉伸9 (cut, through all)
    with BuildSketch(Plane(origin=(0, -0.662507051, 4.910619092), x_dir=(1, 0, 0), z_dir=(0, -0.13370183830700455, 0.9910216034140364))):
        with Locations((5, 45.332571267)):
            Rectangle(SKETCH_12_W, SKETCH_12_H)
        with Locations((85, 43.98597241)):
            Rectangle(SKETCH_12_W, SKETCH_12_H_2)
    extrude(amount=-CUT_EXTRUDE_9_DEPTH, mode=Mode.SUBTRACT)


solid = part.part
